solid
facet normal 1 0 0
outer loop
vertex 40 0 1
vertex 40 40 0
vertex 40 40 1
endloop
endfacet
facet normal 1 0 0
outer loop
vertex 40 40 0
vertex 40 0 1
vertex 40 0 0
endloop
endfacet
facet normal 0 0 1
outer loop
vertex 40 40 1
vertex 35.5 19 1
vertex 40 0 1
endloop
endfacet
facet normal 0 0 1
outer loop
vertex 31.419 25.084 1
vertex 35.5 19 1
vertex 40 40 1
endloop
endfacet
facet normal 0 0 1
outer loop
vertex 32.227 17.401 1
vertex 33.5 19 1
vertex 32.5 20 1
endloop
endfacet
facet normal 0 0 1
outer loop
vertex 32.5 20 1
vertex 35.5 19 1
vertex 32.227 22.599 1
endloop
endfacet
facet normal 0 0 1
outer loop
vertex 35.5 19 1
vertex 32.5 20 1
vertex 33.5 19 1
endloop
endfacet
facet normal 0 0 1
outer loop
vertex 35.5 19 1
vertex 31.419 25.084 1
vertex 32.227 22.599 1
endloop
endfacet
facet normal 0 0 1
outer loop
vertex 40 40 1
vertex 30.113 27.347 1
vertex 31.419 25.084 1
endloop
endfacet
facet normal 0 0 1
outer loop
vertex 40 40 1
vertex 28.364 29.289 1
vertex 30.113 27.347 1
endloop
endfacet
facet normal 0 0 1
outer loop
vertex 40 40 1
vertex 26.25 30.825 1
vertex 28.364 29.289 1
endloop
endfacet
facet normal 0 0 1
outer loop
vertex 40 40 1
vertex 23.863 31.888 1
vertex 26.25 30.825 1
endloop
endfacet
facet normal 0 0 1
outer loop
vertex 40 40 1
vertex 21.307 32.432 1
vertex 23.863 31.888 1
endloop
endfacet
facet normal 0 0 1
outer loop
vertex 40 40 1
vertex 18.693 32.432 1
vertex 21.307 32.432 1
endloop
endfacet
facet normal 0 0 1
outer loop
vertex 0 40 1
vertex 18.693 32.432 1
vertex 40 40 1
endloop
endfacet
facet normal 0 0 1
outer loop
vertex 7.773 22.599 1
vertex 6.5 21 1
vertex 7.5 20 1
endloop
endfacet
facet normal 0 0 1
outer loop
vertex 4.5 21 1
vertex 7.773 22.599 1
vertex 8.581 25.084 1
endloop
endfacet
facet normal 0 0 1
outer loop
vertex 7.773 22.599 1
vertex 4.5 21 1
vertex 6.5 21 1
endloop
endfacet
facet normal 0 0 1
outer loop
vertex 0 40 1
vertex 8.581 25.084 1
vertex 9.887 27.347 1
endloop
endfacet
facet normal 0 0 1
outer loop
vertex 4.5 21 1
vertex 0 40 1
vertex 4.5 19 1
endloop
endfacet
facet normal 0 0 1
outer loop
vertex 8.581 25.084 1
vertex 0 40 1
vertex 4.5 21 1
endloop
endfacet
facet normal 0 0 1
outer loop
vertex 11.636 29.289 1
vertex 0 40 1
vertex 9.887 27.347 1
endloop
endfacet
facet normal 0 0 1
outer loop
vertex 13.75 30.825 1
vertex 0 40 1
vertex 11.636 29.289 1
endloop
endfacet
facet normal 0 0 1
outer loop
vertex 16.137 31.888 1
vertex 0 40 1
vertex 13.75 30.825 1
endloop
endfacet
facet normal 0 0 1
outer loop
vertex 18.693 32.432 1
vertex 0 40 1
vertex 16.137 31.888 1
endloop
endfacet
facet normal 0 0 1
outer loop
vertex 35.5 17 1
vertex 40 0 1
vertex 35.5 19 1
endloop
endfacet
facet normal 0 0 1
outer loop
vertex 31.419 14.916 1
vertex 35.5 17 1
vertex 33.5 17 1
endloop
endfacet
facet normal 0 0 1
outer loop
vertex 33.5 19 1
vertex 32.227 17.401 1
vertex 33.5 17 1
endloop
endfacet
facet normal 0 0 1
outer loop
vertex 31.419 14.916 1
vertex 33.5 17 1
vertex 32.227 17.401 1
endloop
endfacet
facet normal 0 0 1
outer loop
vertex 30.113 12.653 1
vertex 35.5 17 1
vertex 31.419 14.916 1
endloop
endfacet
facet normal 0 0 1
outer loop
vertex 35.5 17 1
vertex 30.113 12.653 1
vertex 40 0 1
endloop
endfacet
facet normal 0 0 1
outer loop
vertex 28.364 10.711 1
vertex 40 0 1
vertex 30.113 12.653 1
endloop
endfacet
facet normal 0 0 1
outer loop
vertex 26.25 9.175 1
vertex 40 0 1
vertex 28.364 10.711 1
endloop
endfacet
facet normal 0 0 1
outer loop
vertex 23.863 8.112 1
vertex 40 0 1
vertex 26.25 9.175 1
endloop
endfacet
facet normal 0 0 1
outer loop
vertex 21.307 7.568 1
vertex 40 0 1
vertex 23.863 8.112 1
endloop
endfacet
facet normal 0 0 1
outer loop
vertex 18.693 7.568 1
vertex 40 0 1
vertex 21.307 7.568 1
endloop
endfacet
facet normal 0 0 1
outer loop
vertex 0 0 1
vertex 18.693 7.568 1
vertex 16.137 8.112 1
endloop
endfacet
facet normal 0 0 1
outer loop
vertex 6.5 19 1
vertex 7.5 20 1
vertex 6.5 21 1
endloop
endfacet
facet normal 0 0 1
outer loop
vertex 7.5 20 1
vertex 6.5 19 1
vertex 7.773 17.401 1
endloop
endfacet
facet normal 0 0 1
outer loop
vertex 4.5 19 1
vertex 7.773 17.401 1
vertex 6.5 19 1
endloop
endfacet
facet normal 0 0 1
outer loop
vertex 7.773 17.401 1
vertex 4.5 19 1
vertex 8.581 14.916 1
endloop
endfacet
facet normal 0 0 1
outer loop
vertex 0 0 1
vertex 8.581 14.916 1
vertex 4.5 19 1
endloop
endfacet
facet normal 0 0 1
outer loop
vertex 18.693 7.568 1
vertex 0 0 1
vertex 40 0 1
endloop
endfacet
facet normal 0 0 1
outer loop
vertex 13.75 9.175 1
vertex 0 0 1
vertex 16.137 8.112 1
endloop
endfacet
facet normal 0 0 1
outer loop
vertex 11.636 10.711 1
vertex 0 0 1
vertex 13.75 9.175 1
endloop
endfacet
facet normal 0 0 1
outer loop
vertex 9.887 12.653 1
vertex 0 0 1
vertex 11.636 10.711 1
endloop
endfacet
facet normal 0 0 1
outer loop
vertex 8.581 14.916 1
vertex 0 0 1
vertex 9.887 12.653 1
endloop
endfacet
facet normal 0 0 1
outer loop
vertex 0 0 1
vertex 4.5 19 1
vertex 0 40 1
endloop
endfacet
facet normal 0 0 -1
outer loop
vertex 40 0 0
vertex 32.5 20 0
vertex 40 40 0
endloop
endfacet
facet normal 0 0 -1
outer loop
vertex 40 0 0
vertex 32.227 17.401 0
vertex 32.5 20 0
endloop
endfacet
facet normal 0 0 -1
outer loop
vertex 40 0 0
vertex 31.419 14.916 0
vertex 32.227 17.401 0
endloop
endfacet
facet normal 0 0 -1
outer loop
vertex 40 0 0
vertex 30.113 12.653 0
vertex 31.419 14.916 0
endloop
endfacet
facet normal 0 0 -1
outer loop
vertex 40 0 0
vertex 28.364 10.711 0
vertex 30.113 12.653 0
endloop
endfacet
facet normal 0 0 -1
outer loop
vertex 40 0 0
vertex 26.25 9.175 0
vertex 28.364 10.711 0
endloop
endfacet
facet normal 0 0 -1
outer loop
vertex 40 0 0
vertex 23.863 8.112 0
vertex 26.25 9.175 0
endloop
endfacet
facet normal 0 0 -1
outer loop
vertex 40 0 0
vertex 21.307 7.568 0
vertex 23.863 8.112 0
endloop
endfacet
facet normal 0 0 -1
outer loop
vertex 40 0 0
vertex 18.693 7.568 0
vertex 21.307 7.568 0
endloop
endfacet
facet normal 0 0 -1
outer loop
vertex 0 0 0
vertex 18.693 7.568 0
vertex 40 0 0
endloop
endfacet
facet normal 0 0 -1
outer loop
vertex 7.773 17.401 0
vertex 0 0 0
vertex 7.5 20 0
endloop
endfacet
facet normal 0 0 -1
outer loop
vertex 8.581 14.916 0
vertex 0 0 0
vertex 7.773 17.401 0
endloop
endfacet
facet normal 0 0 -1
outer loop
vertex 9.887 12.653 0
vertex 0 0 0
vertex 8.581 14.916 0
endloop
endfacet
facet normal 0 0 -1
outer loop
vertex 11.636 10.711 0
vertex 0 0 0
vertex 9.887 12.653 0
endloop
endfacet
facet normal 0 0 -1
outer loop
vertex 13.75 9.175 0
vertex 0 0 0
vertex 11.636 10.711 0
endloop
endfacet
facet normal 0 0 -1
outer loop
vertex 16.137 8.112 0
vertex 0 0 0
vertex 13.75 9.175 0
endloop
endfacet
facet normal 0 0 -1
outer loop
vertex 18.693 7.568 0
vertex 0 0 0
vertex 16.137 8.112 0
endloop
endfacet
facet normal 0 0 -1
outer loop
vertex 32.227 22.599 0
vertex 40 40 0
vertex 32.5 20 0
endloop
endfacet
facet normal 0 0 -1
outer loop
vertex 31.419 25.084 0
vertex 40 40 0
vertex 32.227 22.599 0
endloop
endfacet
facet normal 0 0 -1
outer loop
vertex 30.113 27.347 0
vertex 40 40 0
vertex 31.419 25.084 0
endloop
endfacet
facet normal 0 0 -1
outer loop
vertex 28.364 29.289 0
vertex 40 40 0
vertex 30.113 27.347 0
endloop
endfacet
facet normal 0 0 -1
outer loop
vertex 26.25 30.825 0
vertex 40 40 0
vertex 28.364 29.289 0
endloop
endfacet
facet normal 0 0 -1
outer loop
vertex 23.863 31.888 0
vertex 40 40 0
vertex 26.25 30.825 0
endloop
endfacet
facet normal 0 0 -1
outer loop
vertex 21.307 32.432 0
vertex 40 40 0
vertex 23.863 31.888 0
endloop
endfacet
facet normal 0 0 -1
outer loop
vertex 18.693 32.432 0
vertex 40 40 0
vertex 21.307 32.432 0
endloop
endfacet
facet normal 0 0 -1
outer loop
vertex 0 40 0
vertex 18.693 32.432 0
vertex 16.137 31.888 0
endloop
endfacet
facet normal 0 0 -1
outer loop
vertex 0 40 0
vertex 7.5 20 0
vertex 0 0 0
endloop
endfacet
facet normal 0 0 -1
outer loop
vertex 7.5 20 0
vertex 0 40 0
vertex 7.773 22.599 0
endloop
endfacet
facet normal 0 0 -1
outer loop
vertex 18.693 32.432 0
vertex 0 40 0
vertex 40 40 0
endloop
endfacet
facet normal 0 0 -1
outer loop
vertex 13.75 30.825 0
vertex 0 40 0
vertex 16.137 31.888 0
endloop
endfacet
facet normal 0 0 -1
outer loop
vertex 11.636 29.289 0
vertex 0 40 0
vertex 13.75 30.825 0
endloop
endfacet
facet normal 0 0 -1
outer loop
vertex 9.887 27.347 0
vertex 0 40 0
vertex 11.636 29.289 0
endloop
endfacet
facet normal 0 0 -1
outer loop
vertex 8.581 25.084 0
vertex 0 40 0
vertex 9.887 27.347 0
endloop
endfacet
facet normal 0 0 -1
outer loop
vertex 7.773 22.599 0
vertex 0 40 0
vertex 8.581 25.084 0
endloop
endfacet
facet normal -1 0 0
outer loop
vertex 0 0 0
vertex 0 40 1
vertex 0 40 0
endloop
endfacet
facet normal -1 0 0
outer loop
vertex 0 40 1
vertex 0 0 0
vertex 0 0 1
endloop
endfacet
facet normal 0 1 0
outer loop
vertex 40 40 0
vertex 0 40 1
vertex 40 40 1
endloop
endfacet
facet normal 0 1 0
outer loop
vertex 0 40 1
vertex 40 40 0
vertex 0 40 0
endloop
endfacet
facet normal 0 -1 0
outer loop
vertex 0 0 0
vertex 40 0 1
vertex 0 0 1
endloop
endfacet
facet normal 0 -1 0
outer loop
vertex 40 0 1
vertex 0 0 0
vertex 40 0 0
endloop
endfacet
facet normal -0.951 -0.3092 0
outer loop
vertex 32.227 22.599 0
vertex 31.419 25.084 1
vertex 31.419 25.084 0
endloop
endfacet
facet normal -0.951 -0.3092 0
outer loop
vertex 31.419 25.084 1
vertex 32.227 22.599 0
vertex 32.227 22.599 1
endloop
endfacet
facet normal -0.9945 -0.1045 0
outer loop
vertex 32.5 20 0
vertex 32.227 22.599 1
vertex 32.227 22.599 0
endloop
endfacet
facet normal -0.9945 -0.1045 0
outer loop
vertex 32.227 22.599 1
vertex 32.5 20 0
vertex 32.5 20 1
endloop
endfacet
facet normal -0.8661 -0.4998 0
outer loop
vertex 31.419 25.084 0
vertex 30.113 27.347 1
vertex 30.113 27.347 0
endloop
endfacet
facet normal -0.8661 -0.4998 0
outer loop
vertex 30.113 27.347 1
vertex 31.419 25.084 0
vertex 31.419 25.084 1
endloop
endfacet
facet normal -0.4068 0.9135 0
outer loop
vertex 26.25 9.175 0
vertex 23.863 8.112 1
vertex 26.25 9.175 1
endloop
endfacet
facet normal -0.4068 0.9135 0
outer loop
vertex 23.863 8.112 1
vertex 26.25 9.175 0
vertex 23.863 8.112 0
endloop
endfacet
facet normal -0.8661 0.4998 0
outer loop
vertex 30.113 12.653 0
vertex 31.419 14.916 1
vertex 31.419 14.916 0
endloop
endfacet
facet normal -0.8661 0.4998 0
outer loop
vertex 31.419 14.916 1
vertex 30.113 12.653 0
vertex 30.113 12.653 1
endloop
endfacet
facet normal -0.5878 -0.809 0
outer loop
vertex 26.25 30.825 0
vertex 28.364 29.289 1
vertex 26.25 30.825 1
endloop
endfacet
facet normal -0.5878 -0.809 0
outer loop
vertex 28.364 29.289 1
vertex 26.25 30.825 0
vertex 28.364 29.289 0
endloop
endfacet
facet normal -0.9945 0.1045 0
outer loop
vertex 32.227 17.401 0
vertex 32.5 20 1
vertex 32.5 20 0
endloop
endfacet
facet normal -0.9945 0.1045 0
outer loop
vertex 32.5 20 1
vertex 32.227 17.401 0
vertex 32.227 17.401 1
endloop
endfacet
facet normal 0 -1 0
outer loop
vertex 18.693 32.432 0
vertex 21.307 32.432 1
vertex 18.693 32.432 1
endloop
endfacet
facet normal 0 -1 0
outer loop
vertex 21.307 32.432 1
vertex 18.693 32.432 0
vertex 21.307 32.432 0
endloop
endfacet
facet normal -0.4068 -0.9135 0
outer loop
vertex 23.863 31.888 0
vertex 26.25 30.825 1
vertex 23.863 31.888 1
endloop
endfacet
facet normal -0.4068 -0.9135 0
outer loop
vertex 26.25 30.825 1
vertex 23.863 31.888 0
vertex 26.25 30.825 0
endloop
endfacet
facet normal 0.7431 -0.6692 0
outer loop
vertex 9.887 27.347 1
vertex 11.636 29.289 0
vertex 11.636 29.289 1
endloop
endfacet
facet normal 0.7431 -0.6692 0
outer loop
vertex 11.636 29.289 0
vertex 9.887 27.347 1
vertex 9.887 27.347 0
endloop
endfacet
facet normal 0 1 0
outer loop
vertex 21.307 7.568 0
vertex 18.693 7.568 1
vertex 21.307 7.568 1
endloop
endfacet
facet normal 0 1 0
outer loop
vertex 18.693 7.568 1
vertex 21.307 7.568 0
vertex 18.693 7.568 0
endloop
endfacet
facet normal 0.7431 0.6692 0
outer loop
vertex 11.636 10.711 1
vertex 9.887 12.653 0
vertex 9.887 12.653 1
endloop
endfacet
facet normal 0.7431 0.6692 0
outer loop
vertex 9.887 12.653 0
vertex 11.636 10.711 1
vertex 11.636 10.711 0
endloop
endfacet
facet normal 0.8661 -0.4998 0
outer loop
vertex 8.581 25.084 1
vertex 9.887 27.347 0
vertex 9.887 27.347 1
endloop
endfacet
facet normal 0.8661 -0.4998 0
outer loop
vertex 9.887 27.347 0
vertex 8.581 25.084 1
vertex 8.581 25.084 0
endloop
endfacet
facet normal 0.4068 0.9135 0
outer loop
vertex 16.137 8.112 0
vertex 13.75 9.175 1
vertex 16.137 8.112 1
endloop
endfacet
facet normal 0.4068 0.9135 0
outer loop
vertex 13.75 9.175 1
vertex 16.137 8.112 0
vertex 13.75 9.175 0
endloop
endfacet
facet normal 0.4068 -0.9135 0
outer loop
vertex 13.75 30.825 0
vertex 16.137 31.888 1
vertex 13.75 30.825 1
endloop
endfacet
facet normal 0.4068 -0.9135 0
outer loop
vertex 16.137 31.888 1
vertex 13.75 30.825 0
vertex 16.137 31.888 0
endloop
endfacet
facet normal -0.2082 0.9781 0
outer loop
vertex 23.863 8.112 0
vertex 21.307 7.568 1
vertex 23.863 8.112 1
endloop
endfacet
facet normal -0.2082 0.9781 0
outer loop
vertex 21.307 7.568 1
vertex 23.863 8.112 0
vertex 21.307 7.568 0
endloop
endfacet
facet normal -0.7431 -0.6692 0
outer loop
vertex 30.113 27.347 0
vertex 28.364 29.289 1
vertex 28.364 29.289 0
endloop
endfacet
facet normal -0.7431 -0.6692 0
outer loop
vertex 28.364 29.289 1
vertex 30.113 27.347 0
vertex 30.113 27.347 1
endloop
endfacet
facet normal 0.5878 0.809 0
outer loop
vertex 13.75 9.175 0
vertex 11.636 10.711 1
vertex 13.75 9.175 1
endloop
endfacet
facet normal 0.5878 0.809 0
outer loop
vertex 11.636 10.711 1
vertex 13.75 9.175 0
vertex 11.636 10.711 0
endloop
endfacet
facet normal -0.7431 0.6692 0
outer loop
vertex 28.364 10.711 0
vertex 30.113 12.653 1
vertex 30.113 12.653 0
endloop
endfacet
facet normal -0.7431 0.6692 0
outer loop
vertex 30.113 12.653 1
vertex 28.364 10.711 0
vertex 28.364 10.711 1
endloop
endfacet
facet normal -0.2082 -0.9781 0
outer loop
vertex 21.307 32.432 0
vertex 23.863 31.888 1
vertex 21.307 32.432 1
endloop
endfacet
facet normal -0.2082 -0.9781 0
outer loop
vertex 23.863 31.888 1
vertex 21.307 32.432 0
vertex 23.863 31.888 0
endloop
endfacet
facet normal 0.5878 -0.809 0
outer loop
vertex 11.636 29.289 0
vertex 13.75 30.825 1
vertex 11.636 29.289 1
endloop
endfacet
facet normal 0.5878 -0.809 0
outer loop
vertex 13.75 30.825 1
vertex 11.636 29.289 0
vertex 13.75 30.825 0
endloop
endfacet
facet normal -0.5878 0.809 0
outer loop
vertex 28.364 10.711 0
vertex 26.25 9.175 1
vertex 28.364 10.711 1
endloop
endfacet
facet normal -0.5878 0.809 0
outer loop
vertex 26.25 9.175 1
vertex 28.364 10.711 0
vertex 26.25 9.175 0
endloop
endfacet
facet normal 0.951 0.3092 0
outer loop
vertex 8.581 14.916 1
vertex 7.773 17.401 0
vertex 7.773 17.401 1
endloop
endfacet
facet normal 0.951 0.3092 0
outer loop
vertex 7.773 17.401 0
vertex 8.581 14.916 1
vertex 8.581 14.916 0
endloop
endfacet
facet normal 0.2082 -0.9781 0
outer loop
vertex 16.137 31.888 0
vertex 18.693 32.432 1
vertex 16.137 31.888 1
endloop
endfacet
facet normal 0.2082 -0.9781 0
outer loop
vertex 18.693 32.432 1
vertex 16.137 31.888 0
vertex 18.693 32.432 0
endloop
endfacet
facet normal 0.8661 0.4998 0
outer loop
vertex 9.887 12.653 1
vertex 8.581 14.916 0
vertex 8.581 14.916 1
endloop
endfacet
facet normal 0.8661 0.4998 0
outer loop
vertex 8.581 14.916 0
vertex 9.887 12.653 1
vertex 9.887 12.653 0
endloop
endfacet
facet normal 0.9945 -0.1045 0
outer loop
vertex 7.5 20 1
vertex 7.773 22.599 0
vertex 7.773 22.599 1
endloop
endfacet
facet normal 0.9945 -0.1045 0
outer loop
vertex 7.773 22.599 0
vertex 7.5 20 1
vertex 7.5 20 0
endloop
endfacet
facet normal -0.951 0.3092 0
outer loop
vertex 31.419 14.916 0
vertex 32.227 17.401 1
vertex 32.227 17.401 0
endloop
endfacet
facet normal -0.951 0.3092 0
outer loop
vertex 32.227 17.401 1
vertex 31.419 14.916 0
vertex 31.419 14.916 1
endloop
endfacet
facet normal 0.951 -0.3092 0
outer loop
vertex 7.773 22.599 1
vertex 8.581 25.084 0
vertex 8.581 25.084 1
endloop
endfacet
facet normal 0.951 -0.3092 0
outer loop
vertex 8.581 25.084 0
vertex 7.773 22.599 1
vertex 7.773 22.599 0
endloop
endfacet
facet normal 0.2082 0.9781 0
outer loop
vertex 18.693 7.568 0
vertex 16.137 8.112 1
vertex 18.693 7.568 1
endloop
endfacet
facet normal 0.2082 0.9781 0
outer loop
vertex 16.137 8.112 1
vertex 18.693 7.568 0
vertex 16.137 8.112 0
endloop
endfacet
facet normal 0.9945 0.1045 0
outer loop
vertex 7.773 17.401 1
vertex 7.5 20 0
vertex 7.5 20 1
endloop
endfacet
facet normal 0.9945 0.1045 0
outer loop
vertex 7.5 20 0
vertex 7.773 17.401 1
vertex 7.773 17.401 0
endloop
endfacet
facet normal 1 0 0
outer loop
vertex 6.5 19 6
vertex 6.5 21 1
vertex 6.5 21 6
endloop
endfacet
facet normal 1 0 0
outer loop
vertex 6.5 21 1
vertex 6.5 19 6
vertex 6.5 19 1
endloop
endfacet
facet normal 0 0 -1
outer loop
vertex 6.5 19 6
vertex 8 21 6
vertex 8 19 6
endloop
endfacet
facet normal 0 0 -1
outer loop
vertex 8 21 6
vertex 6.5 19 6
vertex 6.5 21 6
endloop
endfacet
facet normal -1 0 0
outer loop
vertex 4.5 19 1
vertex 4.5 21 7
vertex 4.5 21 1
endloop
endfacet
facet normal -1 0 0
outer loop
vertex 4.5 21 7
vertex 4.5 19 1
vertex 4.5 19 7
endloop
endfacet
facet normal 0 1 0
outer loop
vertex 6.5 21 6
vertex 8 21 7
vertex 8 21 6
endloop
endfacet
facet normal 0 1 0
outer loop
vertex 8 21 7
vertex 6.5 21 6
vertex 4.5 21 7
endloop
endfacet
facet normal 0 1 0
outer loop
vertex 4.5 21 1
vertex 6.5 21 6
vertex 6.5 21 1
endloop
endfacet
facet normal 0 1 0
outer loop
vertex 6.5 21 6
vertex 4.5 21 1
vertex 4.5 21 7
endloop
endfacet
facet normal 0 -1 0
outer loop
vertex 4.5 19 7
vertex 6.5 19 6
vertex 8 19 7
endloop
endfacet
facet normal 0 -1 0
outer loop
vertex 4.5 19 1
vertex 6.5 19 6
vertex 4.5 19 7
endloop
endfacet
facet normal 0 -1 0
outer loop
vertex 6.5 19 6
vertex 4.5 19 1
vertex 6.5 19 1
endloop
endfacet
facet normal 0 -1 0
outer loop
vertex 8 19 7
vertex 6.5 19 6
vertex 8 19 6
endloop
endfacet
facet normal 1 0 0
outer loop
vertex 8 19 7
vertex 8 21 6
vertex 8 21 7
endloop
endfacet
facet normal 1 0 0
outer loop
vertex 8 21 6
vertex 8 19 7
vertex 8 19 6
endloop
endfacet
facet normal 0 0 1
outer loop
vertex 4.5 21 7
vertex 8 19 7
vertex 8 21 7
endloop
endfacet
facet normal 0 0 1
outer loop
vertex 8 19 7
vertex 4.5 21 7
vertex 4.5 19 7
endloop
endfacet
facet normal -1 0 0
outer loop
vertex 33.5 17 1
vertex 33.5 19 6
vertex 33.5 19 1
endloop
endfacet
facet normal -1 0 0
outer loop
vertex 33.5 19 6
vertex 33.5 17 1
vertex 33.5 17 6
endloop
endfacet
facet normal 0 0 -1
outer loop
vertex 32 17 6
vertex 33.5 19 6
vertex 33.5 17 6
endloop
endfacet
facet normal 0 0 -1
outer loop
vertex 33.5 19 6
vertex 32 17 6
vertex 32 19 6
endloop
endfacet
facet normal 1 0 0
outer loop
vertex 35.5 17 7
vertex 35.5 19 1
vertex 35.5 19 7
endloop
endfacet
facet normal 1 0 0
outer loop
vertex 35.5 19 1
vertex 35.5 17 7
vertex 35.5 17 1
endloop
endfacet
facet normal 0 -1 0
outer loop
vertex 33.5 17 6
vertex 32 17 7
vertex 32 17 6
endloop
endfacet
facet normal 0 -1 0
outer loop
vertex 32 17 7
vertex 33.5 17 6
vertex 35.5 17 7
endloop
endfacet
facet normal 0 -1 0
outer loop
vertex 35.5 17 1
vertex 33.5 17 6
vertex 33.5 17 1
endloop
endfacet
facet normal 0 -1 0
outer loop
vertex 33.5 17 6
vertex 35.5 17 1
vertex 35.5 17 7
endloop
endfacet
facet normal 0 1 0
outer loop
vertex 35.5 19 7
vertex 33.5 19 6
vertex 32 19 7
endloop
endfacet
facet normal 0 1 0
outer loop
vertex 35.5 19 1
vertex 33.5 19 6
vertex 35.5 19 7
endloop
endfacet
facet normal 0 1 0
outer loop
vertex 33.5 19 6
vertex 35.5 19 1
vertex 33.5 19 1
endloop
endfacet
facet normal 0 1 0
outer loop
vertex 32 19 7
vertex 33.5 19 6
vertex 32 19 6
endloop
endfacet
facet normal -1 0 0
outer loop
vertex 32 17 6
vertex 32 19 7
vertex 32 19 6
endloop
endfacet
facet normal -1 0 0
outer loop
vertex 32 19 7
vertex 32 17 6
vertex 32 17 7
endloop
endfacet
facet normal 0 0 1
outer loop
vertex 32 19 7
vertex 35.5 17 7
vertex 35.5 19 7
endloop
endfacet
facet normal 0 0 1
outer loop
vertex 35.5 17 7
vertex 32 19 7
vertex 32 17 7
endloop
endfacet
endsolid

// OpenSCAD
/*
 * コーナン販売E17ソケット用取付部品
 *
 * HS-L17KPS/W
 */

module base(){
    difference(){
        cube([40,40,1]);
        translate([20,20,0]) cylinder(h=1,d=25);
    }
}

module fook(){
    union(){
        cube([2,2,5]);
        translate([0,0,5]) cube([3.5,2,1]);
    }
    
}

union(){
    base();
    translate([4.5,19,1]) fook();
    translate([35.5,19,1]) rotate([0,0,180]) fook();
}
